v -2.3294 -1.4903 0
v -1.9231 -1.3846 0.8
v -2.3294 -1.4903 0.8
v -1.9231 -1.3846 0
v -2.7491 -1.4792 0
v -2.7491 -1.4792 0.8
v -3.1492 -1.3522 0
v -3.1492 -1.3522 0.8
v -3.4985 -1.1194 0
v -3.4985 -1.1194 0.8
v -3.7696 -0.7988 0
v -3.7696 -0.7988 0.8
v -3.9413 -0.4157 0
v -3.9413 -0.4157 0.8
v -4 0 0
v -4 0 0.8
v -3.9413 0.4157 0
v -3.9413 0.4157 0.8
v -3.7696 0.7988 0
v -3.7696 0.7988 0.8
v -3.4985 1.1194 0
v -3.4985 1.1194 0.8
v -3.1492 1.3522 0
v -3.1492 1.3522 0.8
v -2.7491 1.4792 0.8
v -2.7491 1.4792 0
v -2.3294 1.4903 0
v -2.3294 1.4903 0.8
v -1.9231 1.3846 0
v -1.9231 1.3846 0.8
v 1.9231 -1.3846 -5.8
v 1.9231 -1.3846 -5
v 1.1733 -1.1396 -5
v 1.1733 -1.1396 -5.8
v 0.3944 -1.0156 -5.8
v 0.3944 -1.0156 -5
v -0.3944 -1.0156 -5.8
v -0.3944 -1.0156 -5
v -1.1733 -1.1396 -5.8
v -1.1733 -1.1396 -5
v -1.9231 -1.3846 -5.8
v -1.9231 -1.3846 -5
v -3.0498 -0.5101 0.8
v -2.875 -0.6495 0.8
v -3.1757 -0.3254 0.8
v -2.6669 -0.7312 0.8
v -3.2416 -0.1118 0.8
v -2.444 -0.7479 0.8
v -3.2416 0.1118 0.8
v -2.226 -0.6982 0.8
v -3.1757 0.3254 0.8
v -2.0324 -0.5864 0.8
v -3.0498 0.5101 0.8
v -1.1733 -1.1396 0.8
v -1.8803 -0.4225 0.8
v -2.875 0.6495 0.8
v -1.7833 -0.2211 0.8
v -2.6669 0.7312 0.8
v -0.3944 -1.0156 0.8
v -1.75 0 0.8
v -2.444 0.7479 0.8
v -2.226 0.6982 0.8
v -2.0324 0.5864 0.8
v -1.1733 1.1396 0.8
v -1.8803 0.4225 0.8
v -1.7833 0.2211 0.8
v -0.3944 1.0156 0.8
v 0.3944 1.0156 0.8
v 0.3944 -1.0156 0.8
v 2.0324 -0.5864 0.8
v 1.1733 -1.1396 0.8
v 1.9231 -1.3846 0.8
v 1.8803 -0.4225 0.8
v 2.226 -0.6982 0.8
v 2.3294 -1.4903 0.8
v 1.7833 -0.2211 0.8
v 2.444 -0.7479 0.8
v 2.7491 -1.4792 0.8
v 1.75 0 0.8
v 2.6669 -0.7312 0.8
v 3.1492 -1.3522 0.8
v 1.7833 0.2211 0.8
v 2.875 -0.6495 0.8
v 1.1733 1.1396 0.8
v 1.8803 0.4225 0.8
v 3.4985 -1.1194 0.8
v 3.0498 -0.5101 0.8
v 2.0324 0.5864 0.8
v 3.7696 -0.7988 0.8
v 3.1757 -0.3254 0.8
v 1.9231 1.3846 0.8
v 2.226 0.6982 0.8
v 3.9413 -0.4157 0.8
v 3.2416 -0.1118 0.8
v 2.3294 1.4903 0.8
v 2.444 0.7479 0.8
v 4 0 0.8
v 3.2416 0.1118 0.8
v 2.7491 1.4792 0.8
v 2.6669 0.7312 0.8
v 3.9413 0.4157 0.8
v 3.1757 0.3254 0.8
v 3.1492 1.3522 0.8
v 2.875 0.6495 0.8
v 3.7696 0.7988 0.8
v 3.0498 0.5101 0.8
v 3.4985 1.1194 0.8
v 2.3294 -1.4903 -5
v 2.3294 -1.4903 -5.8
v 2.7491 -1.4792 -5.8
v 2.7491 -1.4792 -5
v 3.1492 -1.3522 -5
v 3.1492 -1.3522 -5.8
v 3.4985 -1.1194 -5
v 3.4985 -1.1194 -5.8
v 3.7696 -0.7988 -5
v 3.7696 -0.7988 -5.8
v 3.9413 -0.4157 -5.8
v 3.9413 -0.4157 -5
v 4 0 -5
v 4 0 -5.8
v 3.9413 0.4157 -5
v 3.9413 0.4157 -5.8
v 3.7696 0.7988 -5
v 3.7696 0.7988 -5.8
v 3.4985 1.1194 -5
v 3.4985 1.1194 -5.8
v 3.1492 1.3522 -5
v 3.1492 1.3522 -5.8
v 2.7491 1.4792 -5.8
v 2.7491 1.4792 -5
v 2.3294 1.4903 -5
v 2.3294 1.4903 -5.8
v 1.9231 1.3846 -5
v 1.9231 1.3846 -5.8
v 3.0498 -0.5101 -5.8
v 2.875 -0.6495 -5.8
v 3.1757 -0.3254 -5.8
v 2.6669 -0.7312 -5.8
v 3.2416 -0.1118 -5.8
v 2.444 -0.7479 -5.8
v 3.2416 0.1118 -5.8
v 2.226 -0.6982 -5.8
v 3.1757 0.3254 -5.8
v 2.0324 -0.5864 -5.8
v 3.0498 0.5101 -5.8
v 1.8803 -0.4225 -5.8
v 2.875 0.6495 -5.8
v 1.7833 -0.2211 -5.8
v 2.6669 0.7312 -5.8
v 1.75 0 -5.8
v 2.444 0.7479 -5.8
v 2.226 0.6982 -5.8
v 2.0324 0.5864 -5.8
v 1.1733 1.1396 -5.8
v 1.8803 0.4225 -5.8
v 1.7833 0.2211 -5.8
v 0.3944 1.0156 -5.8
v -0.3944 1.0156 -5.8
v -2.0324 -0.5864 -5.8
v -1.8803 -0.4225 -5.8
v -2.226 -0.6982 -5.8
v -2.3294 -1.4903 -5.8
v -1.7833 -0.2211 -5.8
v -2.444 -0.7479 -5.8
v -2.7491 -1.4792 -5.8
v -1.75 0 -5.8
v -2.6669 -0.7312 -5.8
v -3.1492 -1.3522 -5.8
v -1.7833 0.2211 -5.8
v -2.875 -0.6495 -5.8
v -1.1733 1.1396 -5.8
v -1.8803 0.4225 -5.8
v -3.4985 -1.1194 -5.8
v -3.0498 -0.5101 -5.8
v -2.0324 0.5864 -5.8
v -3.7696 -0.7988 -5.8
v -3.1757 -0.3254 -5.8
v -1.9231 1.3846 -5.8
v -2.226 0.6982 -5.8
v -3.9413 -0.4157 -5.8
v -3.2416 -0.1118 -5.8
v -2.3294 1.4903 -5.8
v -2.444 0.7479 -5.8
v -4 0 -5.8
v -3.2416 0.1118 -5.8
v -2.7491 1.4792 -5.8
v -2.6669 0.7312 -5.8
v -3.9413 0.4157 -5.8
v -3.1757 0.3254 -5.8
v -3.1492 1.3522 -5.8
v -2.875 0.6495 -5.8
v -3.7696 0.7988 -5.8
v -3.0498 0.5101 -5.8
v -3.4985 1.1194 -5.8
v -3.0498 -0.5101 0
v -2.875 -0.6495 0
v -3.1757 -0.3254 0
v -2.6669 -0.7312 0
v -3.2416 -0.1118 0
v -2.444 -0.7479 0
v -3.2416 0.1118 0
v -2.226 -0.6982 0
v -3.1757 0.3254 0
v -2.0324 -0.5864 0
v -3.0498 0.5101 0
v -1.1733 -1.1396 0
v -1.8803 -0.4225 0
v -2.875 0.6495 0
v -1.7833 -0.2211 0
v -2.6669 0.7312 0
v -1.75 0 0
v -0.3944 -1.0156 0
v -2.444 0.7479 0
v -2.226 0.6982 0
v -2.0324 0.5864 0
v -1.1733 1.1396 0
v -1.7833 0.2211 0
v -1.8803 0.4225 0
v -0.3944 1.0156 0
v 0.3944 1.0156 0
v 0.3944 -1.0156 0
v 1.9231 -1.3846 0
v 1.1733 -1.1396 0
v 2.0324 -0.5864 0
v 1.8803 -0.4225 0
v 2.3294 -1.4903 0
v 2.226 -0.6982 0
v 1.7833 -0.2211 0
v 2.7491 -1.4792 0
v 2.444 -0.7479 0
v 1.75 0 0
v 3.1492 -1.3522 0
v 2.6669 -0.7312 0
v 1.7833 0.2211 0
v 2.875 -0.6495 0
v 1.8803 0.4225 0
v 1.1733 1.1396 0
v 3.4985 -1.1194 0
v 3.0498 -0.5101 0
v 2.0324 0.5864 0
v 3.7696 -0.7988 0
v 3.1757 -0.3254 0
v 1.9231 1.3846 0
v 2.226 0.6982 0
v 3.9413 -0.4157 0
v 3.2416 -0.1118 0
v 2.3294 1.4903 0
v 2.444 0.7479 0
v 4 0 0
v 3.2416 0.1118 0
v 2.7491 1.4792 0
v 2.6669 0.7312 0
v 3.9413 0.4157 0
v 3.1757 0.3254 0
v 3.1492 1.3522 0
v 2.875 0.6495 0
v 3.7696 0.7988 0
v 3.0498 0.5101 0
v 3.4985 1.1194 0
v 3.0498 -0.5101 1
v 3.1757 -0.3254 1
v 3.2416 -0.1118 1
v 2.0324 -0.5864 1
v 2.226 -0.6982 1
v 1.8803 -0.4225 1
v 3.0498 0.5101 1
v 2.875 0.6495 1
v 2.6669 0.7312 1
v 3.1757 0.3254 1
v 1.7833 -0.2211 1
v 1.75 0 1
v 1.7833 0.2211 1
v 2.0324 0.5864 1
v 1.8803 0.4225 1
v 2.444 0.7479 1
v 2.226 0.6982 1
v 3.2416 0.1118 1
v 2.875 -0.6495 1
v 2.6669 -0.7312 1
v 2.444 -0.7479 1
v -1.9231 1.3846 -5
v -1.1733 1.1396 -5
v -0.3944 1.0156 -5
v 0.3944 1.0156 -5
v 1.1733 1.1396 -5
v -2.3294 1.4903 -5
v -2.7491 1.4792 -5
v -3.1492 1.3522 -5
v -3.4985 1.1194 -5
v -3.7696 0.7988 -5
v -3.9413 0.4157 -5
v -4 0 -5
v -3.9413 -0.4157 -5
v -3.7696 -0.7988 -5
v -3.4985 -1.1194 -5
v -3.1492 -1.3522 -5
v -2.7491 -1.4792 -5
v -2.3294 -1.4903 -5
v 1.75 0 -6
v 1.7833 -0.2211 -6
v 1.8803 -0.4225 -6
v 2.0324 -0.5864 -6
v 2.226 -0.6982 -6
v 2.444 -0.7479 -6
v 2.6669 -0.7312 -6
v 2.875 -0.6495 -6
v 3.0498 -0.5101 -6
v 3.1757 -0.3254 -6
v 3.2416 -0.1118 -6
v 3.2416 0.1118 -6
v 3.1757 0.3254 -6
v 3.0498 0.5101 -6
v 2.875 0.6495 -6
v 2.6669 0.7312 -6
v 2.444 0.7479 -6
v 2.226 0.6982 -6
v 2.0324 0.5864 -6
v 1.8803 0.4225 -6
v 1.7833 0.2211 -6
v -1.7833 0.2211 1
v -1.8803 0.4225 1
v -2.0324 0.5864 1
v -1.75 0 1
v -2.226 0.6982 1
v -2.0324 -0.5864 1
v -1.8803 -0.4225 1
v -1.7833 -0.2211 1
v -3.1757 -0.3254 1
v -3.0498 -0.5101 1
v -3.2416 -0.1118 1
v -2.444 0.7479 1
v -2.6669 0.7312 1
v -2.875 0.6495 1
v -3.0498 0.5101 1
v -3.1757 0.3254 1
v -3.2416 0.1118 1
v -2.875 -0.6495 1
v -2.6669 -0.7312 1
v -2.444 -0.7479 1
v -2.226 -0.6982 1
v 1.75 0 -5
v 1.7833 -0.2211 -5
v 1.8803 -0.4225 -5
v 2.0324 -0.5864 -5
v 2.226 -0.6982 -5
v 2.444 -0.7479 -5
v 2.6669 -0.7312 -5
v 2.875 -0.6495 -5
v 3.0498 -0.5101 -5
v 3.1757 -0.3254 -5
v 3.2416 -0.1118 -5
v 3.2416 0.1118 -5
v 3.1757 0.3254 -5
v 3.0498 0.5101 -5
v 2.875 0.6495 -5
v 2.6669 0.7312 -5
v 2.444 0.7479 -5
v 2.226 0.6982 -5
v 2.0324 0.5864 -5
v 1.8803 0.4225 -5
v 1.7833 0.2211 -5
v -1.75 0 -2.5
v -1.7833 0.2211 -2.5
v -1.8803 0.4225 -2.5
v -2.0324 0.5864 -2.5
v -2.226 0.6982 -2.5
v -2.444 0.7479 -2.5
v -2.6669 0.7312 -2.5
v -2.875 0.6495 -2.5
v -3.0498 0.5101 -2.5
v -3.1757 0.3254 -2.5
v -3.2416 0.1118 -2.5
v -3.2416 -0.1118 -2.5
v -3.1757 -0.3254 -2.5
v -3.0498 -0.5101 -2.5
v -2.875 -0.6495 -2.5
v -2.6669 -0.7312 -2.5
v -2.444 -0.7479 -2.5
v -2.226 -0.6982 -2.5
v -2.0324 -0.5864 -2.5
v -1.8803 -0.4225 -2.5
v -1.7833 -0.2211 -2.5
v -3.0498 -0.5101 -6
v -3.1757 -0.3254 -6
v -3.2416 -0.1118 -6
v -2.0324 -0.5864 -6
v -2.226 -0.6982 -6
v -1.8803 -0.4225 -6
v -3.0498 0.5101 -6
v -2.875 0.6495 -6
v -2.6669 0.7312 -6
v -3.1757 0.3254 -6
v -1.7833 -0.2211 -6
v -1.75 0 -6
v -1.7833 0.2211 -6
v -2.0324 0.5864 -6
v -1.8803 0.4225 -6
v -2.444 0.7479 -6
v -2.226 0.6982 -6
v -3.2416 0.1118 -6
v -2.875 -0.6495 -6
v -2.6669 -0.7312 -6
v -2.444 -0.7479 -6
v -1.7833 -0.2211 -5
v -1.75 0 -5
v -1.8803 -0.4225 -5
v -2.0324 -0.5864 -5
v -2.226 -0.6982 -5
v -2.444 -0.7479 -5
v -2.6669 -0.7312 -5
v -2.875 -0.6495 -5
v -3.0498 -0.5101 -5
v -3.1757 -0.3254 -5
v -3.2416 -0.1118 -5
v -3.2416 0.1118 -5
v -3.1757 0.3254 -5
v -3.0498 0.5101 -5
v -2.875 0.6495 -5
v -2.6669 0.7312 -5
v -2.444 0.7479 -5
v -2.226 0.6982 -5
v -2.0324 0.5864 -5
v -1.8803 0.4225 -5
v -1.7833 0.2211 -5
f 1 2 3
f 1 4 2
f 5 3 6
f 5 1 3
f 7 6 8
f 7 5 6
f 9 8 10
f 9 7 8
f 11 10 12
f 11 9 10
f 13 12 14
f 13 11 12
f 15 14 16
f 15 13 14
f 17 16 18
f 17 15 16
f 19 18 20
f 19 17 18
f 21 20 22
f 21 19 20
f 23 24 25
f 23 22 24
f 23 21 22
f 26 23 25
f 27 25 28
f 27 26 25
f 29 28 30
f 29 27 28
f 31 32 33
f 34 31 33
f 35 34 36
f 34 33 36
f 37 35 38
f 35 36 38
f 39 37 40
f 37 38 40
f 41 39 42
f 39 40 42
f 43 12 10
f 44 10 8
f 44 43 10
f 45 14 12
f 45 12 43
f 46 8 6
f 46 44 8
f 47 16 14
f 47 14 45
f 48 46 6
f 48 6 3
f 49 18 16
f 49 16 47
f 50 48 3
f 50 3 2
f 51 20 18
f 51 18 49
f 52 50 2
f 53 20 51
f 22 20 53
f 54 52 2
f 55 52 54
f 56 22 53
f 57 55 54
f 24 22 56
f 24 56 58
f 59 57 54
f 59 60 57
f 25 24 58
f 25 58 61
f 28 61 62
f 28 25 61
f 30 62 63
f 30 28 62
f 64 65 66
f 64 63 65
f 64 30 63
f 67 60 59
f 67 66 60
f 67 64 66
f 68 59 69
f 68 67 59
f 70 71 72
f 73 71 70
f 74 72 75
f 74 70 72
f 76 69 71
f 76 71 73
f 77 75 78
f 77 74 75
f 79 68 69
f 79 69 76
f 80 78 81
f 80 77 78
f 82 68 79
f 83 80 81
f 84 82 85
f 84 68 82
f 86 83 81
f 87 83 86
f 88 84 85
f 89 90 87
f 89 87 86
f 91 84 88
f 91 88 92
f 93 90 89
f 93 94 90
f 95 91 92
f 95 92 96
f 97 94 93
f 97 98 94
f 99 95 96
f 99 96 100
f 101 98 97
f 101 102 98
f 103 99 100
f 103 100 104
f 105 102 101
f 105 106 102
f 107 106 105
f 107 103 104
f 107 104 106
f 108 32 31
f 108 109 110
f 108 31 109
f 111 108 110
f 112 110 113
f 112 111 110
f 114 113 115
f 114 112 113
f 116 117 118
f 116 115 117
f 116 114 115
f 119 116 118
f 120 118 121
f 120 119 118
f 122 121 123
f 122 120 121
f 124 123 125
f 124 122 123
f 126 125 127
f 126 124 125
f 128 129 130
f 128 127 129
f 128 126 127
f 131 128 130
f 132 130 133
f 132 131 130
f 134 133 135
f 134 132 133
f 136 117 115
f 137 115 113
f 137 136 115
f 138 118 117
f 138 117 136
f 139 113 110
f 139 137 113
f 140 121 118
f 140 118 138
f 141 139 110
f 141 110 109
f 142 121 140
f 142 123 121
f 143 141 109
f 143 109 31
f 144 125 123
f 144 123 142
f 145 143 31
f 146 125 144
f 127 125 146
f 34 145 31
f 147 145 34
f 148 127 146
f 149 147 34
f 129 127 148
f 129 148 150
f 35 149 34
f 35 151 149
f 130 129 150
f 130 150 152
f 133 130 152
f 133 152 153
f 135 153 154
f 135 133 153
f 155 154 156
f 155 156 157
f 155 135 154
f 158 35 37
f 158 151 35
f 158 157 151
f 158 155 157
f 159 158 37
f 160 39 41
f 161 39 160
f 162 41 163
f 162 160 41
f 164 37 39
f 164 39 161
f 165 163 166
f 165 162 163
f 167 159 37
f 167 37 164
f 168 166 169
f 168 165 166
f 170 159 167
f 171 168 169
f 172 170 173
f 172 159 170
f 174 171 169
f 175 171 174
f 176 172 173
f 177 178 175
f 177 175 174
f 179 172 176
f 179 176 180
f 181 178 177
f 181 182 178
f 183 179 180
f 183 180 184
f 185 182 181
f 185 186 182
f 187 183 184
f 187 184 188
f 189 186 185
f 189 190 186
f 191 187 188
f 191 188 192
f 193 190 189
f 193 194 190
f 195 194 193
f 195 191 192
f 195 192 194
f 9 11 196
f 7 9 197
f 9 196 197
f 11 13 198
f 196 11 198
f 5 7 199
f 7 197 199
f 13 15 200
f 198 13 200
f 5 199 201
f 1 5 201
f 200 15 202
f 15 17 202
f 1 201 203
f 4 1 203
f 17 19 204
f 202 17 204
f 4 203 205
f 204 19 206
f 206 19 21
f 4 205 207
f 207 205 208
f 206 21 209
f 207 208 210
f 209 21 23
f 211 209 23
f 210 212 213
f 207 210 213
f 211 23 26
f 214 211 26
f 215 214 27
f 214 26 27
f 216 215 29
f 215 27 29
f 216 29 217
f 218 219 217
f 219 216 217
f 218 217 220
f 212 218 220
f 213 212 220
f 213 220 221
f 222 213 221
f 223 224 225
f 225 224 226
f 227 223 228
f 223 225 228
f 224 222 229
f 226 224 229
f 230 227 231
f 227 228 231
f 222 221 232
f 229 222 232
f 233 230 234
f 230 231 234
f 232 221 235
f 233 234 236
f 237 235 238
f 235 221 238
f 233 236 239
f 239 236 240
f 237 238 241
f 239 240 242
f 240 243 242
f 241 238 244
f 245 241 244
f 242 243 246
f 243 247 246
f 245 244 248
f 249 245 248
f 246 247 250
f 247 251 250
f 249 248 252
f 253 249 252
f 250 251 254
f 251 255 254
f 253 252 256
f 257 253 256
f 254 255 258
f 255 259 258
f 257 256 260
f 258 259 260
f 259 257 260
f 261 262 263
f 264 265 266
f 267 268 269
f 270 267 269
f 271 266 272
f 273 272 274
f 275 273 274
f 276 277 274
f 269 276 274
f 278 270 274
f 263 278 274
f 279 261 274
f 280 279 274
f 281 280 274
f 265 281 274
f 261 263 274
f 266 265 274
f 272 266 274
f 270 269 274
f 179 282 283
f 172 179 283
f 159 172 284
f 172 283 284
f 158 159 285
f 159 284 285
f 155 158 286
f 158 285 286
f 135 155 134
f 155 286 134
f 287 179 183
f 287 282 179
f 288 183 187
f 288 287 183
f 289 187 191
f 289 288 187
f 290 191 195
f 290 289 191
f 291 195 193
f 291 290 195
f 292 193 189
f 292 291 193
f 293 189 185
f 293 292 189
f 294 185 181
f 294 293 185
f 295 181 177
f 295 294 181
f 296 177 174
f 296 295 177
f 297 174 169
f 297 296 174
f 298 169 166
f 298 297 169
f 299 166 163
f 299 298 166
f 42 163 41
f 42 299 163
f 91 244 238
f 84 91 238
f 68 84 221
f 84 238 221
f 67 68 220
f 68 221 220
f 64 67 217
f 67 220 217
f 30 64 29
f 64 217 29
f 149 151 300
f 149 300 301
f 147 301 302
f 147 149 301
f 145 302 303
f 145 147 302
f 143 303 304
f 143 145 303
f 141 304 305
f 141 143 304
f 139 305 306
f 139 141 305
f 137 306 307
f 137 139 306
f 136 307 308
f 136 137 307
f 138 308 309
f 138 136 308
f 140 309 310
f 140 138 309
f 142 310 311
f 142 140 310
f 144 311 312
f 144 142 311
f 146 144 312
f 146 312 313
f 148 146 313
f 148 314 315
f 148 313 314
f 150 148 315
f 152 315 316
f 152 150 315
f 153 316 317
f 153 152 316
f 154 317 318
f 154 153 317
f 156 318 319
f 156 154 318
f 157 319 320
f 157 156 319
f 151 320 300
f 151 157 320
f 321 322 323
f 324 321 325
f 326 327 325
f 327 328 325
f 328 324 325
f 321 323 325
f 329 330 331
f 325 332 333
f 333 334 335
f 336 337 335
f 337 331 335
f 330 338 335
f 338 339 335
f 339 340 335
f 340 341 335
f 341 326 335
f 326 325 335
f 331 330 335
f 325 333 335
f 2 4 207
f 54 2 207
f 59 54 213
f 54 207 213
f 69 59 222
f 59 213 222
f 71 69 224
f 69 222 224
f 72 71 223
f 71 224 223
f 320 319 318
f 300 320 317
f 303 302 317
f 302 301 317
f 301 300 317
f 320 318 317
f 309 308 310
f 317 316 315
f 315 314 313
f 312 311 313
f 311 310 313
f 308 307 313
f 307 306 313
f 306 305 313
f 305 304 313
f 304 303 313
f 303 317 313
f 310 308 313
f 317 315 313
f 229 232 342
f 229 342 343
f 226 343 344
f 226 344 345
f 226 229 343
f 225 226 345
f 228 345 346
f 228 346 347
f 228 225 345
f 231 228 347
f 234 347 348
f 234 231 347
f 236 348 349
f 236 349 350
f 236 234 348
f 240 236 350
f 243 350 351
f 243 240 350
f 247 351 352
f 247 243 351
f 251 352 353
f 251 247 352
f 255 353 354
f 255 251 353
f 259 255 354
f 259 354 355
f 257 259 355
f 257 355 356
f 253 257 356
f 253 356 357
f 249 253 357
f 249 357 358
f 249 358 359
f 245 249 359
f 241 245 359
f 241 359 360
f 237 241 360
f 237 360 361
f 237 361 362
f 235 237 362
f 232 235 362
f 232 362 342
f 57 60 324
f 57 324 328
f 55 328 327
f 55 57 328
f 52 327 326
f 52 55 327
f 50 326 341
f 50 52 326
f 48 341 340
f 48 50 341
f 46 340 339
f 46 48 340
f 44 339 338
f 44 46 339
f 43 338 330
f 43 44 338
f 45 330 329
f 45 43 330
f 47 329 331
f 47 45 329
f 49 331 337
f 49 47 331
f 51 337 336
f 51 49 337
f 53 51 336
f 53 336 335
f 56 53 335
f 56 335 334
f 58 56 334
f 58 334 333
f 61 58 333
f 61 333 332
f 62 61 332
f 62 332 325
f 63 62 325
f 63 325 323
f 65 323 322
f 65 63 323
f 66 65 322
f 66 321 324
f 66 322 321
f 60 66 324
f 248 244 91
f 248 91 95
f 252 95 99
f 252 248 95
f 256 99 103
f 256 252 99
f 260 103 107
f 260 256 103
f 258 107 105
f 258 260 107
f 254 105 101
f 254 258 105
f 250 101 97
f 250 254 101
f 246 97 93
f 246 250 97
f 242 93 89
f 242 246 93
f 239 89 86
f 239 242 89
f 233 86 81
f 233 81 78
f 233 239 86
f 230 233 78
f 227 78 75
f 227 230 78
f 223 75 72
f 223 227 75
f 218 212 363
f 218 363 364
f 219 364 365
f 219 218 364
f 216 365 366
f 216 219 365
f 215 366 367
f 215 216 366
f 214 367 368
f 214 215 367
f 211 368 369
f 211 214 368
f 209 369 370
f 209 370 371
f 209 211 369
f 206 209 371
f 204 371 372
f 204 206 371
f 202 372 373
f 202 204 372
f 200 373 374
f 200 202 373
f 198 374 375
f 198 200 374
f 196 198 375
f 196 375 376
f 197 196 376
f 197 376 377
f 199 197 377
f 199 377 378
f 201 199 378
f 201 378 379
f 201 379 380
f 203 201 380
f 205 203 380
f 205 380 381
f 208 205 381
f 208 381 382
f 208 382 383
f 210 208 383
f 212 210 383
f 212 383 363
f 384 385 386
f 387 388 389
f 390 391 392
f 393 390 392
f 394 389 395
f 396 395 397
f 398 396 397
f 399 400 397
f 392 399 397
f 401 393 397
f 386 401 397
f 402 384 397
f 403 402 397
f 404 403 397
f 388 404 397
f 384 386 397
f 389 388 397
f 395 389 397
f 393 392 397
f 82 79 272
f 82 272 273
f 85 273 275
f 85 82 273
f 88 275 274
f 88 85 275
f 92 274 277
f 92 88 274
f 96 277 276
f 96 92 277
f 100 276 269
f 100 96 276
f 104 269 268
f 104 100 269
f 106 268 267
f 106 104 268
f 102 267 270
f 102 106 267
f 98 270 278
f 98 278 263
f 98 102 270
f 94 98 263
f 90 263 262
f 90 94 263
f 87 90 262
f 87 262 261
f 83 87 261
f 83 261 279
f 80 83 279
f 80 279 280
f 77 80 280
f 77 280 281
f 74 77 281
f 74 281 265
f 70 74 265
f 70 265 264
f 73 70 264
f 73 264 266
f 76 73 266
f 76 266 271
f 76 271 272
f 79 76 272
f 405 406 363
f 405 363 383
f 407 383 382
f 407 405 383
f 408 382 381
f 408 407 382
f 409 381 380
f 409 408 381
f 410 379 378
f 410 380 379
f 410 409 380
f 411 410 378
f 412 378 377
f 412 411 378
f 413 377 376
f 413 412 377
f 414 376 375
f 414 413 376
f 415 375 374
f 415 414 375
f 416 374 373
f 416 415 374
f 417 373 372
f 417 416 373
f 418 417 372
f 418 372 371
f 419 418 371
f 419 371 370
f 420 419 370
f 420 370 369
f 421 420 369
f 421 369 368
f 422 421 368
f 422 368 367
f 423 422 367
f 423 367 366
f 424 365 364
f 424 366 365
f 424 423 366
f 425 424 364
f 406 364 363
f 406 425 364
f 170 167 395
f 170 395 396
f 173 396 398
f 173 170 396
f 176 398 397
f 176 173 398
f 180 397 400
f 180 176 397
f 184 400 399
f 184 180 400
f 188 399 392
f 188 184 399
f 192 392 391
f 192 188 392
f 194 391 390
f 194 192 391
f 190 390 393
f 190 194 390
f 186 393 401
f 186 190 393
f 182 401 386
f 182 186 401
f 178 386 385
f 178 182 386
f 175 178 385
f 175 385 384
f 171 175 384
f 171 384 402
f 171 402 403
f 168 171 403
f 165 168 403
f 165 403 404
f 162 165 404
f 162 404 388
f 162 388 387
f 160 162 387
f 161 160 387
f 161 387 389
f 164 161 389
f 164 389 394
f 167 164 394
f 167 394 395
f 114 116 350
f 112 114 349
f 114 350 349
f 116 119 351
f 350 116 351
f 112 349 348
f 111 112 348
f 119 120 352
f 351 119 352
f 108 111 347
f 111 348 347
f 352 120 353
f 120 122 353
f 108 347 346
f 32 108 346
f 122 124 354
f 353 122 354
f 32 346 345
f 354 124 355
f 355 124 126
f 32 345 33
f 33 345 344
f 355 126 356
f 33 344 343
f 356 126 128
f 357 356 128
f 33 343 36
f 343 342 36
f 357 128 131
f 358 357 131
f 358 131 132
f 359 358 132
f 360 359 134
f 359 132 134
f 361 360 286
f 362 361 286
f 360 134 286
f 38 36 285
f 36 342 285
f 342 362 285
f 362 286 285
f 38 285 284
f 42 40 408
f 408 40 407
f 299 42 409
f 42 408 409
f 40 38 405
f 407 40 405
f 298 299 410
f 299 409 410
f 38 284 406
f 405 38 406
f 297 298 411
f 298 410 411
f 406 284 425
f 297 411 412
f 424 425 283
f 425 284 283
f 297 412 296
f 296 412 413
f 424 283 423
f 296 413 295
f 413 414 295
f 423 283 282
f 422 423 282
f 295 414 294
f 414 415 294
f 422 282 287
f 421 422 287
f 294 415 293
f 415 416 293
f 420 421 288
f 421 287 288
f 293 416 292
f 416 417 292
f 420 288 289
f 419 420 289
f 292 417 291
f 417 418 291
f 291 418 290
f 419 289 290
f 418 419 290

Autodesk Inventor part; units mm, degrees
ref_plane "YZ Plane" through (0, 0, 0) normal (1, 0, 0) x (0, 1, 0)
ref_plane "XZ Plane" through (0, 0, 0) normal (0, 1, 0) x (-1, 0, 0)
sketch "Sketch2" plane through (0, 0, 0) normal (0, 0, 1) x (1, 0, 0)
  circle A0 centre (2.5, 0) radius 1.5
  circle A1 centre (-2.5, 0) radius 1.5
  arc A2 (-1.9231, 1.3846) -> (1.9231, 1.3846) centre (0, 6) ccw
  arc A3 (1.9231, -1.3846) -> (-1.9231, -1.3846) centre (0, -6) ccw
  circle A4 centre (2.5, 0) radius 0.75
  circle A5 centre (-2.5, 0) radius 0.75
  point P0 (0, 0)
  dimension "d0" = 3
  dimension "d1" = 3
  dimension "d2" = 6
  dimension "d3" = 6
  dimension "d4" = 2.5
  dimension "d5" = 2.5
  dimension "d6" = 1.5
  dimension "d7" = 1.5
extrude "Extrusion2" add sketch "Sketch2" along normal blind 0.8
ref_plane "Work Plane7" through (0, 0, 0) normal (0, 0, -1) x (-1, 0, 0)
sketch "Sketch9" plane through (0, 0, 0) normal (0, 0, -1) x (-1, 0, 0)
  arc A0 (1.9231, -1.3846) -> (-1.9231, -1.3846) centre (0, -6) ccw projected
  arc A1 (1.9231, -1.3846) -> (1.9231, 1.3846) centre (2.5, 0) ccw projected
  arc A2 (-1.9231, 1.3846) -> (1.9231, 1.3846) centre (0, 6) ccw projected
  arc A3 (-1.9231, 1.3846) -> (-1.9231, -1.3846) centre (-2.5, 0) ccw projected
  circle A4 centre (-2.5, 0) radius 0.75 projected
  circle A5 centre (2.5, 0) radius 0.75 projected
  circle A6 centre (-2.5, 0) radius 0.75
  point P0 (0, 0)
extrude "Extrusion8" add sketch "Sketch9" along normal blind 2.5 and the other way blind 1 contours A4
mirror "Mirror7" about plane through (0, 0, 0) normal (1, 0, 0) of "Extrusion8"
mirror "Mirror8" about plane through (-2.5, 0, -2.5) normal (0, 0, -1) of "Extrusion2", "Extrusion8", "Mirror7"
equation "\"d1\" = d0"
equation "\"d2\" = 2 * d0"
equation "\"d3\" = d2"
equation "\"d4\" = d5"
equation "\"d7\" = d6"
properties part number "chain ink_outer"
